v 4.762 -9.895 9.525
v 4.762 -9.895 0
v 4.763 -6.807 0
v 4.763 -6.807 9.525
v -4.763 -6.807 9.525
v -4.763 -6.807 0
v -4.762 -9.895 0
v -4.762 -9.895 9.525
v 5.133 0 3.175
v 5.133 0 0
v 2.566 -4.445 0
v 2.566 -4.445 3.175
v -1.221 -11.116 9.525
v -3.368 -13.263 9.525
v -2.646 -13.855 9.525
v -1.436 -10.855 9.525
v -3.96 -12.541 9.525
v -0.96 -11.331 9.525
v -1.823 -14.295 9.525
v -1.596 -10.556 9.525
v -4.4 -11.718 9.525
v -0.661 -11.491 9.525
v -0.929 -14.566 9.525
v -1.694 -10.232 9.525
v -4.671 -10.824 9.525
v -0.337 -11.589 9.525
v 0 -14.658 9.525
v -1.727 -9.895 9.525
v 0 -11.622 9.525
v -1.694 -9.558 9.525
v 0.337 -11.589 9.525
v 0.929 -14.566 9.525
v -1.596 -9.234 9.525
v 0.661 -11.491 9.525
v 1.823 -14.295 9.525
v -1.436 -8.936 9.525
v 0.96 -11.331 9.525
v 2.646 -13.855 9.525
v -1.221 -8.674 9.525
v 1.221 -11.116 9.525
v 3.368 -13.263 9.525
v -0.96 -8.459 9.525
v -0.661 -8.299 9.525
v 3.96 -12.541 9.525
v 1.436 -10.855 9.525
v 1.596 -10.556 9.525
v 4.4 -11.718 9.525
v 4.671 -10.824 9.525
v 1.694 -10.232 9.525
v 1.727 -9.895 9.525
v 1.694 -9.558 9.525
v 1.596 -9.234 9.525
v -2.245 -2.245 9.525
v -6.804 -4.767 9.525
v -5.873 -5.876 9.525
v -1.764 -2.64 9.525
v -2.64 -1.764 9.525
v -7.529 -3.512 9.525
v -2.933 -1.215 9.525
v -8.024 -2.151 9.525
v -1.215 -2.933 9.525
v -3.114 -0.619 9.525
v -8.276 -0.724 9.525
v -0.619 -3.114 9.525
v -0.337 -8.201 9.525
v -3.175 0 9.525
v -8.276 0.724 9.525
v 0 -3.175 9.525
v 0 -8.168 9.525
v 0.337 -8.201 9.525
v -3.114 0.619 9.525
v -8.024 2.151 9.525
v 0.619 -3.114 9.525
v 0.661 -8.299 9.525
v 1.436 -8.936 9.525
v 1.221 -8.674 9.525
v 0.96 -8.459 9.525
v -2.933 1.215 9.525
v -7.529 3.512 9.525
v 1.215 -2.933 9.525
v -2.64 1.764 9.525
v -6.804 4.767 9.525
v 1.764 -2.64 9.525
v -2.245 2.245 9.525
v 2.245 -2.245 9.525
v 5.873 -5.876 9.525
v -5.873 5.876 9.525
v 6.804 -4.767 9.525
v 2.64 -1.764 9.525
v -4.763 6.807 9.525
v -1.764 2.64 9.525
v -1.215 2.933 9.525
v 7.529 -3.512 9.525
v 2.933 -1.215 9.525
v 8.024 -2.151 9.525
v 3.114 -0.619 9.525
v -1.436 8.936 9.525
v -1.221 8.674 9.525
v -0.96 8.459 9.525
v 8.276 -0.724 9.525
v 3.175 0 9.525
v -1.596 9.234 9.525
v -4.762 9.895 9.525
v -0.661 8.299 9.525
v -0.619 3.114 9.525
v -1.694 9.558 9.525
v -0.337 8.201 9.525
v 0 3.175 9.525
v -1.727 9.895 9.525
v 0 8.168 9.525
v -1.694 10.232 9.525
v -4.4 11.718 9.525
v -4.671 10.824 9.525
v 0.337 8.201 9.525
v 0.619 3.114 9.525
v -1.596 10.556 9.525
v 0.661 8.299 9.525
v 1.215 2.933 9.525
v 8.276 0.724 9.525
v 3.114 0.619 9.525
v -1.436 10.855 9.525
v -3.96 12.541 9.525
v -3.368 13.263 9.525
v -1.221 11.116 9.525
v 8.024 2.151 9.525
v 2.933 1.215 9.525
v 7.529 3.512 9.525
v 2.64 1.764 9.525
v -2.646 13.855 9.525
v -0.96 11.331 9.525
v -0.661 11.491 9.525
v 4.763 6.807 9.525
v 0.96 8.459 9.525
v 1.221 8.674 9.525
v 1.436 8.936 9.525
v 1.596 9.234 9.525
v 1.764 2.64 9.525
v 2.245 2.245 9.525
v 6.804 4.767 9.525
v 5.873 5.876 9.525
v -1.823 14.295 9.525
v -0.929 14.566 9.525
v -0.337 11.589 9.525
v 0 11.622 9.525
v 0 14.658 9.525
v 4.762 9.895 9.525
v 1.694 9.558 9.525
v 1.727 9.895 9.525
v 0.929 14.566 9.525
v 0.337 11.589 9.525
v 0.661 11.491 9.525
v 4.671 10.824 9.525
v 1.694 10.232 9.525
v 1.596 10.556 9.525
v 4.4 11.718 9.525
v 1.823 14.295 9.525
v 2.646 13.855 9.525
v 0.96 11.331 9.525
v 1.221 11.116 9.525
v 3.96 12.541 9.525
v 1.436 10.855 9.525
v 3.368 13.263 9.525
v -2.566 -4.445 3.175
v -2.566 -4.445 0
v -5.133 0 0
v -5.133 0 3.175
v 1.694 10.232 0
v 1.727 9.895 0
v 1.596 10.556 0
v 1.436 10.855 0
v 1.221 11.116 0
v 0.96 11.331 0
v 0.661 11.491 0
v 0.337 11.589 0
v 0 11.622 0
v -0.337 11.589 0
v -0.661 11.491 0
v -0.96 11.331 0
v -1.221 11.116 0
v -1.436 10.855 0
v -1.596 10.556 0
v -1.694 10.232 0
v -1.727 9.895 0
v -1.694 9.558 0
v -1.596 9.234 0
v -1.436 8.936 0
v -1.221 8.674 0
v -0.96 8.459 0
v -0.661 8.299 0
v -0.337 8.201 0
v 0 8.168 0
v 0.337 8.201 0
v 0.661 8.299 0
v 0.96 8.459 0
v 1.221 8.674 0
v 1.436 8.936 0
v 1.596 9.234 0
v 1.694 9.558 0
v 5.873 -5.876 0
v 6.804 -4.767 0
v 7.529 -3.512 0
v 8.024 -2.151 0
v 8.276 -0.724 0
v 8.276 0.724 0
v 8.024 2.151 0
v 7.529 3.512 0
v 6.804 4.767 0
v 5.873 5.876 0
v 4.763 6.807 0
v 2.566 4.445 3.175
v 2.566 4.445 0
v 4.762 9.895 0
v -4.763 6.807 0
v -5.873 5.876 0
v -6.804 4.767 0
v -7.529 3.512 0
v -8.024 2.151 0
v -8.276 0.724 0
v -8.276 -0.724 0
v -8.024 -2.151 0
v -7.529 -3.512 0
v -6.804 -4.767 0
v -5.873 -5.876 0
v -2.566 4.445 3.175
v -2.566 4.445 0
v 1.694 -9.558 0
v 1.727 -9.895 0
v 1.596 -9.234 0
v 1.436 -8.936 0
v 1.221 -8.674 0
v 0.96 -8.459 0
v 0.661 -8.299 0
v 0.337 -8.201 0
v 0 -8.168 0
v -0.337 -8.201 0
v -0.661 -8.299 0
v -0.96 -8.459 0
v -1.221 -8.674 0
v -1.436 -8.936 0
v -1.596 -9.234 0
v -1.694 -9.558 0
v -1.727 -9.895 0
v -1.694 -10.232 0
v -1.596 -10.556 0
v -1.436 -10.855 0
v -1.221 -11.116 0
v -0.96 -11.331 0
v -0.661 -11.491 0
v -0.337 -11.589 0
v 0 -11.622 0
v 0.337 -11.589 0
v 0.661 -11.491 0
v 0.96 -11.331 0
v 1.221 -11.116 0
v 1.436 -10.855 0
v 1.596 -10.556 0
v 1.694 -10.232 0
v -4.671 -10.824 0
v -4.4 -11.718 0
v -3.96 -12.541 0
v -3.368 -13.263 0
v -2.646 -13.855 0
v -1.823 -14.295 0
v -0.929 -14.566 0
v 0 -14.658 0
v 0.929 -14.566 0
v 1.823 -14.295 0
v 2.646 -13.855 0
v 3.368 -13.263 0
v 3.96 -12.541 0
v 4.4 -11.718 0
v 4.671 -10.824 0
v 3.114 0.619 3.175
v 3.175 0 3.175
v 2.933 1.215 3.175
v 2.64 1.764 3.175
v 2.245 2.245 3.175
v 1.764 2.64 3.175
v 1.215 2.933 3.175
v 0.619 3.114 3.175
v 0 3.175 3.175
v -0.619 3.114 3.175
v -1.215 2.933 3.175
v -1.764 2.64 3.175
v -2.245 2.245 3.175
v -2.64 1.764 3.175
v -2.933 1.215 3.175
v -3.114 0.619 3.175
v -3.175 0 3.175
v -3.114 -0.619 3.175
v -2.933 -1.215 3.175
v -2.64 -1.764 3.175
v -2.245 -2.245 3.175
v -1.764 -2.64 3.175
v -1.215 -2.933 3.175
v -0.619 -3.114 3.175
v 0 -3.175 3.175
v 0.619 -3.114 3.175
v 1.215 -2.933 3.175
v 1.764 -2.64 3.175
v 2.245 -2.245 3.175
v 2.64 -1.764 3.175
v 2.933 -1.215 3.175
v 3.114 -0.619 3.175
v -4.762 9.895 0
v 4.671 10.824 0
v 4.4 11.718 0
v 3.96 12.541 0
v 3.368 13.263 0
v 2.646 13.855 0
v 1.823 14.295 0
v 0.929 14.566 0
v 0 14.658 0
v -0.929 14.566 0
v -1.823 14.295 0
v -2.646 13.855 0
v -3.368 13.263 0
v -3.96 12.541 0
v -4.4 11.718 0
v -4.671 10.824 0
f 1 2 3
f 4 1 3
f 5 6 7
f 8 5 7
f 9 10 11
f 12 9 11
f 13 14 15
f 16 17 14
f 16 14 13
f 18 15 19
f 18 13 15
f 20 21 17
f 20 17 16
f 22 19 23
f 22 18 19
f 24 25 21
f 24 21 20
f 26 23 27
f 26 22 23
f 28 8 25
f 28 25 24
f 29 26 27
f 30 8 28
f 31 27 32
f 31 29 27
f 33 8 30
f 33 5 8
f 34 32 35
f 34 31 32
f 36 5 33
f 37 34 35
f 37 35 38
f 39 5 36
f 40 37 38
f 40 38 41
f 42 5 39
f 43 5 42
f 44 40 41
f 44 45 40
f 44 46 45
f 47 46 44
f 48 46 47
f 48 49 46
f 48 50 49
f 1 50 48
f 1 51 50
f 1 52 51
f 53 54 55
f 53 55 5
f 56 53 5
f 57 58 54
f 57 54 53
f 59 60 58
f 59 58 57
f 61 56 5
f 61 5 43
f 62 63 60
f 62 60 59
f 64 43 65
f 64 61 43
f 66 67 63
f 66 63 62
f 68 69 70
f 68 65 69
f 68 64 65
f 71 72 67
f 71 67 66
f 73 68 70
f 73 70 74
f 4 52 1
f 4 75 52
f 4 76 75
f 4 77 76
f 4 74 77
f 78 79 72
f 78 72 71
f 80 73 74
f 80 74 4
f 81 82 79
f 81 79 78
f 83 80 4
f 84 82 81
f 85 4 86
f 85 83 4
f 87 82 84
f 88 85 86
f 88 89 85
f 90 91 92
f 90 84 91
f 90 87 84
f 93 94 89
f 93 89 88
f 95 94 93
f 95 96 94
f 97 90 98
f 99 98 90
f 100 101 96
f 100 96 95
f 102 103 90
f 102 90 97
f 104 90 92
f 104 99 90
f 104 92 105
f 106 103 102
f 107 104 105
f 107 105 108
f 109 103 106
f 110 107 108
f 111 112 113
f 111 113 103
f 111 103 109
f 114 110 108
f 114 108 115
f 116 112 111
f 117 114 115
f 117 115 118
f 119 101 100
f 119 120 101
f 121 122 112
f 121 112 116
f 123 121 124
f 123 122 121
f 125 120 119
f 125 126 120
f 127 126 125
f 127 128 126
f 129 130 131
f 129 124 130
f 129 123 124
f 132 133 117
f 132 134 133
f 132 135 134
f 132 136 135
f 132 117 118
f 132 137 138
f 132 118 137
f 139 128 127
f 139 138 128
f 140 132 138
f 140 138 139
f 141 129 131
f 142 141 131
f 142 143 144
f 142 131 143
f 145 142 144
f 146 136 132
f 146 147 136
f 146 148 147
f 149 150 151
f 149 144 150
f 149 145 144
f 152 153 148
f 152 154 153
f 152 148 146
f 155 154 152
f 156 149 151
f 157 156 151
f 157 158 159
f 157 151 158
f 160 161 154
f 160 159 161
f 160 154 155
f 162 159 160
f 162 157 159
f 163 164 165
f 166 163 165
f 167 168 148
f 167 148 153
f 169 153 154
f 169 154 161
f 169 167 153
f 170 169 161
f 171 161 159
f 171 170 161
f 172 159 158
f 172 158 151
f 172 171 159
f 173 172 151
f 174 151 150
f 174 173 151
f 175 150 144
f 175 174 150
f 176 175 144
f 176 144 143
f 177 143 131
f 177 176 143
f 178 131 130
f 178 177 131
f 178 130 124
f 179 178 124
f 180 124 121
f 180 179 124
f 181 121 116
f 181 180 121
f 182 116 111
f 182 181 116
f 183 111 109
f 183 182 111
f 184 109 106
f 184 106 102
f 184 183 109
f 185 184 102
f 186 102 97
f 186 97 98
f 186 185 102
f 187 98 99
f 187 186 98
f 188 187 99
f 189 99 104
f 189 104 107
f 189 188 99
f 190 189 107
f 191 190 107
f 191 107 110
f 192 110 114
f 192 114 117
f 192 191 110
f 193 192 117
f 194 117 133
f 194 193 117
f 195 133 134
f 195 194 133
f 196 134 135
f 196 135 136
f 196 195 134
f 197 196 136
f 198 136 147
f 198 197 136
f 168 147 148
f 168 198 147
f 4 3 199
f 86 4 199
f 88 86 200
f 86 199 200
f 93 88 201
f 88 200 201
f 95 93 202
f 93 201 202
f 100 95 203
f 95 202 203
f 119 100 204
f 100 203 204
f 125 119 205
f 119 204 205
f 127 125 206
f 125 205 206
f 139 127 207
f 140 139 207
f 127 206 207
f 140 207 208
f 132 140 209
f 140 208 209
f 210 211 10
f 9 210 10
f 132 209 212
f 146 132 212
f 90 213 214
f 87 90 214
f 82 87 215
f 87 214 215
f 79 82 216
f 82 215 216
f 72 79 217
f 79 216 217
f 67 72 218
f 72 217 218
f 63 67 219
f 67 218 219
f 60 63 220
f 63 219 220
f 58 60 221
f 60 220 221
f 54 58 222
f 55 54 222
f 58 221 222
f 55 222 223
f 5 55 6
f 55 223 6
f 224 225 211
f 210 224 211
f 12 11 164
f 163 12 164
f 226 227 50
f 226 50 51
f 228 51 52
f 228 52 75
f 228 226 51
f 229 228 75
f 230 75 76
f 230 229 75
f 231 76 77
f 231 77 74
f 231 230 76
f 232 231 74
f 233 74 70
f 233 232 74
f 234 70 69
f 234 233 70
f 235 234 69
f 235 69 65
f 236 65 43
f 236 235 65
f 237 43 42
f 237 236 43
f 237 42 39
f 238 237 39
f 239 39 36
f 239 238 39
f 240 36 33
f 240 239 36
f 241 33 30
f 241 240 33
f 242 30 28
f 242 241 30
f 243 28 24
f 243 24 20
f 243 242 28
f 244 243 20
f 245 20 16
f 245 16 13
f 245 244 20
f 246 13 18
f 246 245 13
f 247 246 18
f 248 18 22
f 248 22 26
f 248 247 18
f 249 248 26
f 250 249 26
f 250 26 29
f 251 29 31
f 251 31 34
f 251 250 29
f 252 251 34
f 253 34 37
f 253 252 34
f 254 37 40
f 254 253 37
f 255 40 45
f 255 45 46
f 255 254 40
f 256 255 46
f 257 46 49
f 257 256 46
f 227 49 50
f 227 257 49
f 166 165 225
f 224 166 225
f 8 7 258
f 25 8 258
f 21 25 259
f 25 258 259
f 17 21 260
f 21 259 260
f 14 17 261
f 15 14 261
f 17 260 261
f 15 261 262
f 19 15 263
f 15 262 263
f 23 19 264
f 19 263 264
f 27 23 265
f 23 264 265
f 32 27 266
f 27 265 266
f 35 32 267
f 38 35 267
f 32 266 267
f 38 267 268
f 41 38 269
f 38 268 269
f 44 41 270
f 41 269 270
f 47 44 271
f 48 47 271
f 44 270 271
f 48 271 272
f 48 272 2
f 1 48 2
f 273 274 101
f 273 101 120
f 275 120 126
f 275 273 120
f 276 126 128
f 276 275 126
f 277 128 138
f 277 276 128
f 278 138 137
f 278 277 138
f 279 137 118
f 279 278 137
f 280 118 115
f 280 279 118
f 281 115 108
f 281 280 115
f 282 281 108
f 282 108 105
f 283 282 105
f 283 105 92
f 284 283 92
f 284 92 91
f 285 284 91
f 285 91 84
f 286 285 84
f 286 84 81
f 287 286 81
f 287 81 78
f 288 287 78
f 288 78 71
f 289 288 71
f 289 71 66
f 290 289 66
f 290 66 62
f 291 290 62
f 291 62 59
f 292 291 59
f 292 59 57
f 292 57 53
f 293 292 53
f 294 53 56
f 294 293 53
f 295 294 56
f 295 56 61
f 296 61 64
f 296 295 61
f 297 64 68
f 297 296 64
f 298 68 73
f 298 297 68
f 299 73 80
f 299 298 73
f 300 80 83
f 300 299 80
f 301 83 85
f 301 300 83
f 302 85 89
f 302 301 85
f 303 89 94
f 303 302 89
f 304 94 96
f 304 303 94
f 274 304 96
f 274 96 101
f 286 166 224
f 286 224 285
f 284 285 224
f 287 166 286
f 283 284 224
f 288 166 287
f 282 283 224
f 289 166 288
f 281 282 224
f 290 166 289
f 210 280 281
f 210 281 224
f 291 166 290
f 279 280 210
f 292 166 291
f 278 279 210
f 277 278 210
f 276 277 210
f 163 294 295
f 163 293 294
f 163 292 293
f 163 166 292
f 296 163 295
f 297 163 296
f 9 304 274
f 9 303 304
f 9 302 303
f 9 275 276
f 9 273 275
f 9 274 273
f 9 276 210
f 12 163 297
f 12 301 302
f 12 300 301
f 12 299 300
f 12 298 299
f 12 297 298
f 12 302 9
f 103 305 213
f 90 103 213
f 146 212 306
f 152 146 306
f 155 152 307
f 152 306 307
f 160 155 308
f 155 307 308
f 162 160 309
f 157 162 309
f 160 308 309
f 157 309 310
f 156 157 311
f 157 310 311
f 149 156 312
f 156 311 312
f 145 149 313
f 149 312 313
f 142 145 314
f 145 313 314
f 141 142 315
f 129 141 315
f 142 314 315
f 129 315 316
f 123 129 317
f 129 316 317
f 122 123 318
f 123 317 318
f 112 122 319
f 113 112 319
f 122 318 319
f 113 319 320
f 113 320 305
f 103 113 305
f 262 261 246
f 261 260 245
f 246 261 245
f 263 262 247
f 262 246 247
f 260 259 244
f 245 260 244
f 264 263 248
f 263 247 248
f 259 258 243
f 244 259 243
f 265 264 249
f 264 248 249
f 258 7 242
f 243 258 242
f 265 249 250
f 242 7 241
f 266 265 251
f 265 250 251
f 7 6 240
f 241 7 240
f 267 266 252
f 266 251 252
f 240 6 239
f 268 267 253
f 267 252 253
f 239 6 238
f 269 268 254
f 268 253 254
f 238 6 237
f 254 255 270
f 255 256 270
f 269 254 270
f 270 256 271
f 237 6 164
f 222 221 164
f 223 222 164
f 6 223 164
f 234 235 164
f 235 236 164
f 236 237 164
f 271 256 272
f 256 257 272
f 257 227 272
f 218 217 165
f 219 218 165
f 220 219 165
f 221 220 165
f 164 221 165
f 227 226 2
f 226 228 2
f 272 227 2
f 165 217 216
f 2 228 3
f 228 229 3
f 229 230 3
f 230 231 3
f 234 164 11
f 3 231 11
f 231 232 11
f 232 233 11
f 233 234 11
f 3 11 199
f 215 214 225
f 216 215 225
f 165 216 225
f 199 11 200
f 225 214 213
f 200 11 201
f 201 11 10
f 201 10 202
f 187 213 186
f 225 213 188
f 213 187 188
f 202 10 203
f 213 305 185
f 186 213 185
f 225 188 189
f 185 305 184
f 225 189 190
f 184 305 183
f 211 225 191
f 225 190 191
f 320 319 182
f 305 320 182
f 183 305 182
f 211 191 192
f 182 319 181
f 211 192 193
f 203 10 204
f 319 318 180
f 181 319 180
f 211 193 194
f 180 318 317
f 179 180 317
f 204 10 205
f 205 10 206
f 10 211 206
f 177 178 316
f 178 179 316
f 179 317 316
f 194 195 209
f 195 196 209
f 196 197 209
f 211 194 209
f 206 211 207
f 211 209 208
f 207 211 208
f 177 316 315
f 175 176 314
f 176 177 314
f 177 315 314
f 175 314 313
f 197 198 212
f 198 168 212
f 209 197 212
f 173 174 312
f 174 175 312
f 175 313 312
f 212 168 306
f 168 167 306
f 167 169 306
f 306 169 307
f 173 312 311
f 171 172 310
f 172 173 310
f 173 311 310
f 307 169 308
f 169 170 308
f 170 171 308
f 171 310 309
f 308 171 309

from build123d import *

# Parameters (mm, degrees)
F0_R     = 1.7272
F0_R_2   = 3.175
F1_DEPTH = 9.525
F3_DEPTH = 3.175


with BuildPart() as f1:
    # F0 (on Top) → F1 (new body)
    with BuildSketch(Plane.XY):
        with BuildLine():
            Line((-4.7625, 9.895144), (-4.7625, 6.807021))
            ThreePointArc((-4.7625, 6.807021), (-8.307644, 0), (-4.7625, -6.807021))
            Line((-4.7625, -6.807021), (-4.7625, -9.895144))
            ThreePointArc((-4.7625, -9.895144), (0, -14.657644), (4.7625, -9.895144))
            Line((4.7625, -9.895144), (4.7625, -6.807021))
            ThreePointArc((4.7625, -6.807021), (8.307644, 0), (4.7625, 6.807021))
            Line((4.7625, 6.807021), (4.7625, 9.895144))
            ThreePointArc((4.7625, 9.895144), (0, 14.657644), (-4.7625, 9.895144))
        make_face()
        with Locations((0, -9.895144)):
            Circle(F0_R, mode=Mode.SUBTRACT)
        Circle(F0_R_2, mode=Mode.SUBTRACT)
        with Locations((0, 9.895144)):
            Circle(F0_R, mode=Mode.SUBTRACT)
    extrude(amount=F1_DEPTH)

    # F2 (on face) → F3 (cut)
    with BuildSketch(Plane(origin=(0, 0, 0), x_dir=(1, 0, 0), z_dir=(0, 0, -1))):
        Polygon((-2.566322, 4.445), (-5.132644, 0), (-2.566322, -4.445), (2.566322, -4.445), (5.132644, 0), (2.566322, 4.445), align=None)
    extrude(amount=-F3_DEPTH, mode=Mode.SUBTRACT)


solid = f1.part
